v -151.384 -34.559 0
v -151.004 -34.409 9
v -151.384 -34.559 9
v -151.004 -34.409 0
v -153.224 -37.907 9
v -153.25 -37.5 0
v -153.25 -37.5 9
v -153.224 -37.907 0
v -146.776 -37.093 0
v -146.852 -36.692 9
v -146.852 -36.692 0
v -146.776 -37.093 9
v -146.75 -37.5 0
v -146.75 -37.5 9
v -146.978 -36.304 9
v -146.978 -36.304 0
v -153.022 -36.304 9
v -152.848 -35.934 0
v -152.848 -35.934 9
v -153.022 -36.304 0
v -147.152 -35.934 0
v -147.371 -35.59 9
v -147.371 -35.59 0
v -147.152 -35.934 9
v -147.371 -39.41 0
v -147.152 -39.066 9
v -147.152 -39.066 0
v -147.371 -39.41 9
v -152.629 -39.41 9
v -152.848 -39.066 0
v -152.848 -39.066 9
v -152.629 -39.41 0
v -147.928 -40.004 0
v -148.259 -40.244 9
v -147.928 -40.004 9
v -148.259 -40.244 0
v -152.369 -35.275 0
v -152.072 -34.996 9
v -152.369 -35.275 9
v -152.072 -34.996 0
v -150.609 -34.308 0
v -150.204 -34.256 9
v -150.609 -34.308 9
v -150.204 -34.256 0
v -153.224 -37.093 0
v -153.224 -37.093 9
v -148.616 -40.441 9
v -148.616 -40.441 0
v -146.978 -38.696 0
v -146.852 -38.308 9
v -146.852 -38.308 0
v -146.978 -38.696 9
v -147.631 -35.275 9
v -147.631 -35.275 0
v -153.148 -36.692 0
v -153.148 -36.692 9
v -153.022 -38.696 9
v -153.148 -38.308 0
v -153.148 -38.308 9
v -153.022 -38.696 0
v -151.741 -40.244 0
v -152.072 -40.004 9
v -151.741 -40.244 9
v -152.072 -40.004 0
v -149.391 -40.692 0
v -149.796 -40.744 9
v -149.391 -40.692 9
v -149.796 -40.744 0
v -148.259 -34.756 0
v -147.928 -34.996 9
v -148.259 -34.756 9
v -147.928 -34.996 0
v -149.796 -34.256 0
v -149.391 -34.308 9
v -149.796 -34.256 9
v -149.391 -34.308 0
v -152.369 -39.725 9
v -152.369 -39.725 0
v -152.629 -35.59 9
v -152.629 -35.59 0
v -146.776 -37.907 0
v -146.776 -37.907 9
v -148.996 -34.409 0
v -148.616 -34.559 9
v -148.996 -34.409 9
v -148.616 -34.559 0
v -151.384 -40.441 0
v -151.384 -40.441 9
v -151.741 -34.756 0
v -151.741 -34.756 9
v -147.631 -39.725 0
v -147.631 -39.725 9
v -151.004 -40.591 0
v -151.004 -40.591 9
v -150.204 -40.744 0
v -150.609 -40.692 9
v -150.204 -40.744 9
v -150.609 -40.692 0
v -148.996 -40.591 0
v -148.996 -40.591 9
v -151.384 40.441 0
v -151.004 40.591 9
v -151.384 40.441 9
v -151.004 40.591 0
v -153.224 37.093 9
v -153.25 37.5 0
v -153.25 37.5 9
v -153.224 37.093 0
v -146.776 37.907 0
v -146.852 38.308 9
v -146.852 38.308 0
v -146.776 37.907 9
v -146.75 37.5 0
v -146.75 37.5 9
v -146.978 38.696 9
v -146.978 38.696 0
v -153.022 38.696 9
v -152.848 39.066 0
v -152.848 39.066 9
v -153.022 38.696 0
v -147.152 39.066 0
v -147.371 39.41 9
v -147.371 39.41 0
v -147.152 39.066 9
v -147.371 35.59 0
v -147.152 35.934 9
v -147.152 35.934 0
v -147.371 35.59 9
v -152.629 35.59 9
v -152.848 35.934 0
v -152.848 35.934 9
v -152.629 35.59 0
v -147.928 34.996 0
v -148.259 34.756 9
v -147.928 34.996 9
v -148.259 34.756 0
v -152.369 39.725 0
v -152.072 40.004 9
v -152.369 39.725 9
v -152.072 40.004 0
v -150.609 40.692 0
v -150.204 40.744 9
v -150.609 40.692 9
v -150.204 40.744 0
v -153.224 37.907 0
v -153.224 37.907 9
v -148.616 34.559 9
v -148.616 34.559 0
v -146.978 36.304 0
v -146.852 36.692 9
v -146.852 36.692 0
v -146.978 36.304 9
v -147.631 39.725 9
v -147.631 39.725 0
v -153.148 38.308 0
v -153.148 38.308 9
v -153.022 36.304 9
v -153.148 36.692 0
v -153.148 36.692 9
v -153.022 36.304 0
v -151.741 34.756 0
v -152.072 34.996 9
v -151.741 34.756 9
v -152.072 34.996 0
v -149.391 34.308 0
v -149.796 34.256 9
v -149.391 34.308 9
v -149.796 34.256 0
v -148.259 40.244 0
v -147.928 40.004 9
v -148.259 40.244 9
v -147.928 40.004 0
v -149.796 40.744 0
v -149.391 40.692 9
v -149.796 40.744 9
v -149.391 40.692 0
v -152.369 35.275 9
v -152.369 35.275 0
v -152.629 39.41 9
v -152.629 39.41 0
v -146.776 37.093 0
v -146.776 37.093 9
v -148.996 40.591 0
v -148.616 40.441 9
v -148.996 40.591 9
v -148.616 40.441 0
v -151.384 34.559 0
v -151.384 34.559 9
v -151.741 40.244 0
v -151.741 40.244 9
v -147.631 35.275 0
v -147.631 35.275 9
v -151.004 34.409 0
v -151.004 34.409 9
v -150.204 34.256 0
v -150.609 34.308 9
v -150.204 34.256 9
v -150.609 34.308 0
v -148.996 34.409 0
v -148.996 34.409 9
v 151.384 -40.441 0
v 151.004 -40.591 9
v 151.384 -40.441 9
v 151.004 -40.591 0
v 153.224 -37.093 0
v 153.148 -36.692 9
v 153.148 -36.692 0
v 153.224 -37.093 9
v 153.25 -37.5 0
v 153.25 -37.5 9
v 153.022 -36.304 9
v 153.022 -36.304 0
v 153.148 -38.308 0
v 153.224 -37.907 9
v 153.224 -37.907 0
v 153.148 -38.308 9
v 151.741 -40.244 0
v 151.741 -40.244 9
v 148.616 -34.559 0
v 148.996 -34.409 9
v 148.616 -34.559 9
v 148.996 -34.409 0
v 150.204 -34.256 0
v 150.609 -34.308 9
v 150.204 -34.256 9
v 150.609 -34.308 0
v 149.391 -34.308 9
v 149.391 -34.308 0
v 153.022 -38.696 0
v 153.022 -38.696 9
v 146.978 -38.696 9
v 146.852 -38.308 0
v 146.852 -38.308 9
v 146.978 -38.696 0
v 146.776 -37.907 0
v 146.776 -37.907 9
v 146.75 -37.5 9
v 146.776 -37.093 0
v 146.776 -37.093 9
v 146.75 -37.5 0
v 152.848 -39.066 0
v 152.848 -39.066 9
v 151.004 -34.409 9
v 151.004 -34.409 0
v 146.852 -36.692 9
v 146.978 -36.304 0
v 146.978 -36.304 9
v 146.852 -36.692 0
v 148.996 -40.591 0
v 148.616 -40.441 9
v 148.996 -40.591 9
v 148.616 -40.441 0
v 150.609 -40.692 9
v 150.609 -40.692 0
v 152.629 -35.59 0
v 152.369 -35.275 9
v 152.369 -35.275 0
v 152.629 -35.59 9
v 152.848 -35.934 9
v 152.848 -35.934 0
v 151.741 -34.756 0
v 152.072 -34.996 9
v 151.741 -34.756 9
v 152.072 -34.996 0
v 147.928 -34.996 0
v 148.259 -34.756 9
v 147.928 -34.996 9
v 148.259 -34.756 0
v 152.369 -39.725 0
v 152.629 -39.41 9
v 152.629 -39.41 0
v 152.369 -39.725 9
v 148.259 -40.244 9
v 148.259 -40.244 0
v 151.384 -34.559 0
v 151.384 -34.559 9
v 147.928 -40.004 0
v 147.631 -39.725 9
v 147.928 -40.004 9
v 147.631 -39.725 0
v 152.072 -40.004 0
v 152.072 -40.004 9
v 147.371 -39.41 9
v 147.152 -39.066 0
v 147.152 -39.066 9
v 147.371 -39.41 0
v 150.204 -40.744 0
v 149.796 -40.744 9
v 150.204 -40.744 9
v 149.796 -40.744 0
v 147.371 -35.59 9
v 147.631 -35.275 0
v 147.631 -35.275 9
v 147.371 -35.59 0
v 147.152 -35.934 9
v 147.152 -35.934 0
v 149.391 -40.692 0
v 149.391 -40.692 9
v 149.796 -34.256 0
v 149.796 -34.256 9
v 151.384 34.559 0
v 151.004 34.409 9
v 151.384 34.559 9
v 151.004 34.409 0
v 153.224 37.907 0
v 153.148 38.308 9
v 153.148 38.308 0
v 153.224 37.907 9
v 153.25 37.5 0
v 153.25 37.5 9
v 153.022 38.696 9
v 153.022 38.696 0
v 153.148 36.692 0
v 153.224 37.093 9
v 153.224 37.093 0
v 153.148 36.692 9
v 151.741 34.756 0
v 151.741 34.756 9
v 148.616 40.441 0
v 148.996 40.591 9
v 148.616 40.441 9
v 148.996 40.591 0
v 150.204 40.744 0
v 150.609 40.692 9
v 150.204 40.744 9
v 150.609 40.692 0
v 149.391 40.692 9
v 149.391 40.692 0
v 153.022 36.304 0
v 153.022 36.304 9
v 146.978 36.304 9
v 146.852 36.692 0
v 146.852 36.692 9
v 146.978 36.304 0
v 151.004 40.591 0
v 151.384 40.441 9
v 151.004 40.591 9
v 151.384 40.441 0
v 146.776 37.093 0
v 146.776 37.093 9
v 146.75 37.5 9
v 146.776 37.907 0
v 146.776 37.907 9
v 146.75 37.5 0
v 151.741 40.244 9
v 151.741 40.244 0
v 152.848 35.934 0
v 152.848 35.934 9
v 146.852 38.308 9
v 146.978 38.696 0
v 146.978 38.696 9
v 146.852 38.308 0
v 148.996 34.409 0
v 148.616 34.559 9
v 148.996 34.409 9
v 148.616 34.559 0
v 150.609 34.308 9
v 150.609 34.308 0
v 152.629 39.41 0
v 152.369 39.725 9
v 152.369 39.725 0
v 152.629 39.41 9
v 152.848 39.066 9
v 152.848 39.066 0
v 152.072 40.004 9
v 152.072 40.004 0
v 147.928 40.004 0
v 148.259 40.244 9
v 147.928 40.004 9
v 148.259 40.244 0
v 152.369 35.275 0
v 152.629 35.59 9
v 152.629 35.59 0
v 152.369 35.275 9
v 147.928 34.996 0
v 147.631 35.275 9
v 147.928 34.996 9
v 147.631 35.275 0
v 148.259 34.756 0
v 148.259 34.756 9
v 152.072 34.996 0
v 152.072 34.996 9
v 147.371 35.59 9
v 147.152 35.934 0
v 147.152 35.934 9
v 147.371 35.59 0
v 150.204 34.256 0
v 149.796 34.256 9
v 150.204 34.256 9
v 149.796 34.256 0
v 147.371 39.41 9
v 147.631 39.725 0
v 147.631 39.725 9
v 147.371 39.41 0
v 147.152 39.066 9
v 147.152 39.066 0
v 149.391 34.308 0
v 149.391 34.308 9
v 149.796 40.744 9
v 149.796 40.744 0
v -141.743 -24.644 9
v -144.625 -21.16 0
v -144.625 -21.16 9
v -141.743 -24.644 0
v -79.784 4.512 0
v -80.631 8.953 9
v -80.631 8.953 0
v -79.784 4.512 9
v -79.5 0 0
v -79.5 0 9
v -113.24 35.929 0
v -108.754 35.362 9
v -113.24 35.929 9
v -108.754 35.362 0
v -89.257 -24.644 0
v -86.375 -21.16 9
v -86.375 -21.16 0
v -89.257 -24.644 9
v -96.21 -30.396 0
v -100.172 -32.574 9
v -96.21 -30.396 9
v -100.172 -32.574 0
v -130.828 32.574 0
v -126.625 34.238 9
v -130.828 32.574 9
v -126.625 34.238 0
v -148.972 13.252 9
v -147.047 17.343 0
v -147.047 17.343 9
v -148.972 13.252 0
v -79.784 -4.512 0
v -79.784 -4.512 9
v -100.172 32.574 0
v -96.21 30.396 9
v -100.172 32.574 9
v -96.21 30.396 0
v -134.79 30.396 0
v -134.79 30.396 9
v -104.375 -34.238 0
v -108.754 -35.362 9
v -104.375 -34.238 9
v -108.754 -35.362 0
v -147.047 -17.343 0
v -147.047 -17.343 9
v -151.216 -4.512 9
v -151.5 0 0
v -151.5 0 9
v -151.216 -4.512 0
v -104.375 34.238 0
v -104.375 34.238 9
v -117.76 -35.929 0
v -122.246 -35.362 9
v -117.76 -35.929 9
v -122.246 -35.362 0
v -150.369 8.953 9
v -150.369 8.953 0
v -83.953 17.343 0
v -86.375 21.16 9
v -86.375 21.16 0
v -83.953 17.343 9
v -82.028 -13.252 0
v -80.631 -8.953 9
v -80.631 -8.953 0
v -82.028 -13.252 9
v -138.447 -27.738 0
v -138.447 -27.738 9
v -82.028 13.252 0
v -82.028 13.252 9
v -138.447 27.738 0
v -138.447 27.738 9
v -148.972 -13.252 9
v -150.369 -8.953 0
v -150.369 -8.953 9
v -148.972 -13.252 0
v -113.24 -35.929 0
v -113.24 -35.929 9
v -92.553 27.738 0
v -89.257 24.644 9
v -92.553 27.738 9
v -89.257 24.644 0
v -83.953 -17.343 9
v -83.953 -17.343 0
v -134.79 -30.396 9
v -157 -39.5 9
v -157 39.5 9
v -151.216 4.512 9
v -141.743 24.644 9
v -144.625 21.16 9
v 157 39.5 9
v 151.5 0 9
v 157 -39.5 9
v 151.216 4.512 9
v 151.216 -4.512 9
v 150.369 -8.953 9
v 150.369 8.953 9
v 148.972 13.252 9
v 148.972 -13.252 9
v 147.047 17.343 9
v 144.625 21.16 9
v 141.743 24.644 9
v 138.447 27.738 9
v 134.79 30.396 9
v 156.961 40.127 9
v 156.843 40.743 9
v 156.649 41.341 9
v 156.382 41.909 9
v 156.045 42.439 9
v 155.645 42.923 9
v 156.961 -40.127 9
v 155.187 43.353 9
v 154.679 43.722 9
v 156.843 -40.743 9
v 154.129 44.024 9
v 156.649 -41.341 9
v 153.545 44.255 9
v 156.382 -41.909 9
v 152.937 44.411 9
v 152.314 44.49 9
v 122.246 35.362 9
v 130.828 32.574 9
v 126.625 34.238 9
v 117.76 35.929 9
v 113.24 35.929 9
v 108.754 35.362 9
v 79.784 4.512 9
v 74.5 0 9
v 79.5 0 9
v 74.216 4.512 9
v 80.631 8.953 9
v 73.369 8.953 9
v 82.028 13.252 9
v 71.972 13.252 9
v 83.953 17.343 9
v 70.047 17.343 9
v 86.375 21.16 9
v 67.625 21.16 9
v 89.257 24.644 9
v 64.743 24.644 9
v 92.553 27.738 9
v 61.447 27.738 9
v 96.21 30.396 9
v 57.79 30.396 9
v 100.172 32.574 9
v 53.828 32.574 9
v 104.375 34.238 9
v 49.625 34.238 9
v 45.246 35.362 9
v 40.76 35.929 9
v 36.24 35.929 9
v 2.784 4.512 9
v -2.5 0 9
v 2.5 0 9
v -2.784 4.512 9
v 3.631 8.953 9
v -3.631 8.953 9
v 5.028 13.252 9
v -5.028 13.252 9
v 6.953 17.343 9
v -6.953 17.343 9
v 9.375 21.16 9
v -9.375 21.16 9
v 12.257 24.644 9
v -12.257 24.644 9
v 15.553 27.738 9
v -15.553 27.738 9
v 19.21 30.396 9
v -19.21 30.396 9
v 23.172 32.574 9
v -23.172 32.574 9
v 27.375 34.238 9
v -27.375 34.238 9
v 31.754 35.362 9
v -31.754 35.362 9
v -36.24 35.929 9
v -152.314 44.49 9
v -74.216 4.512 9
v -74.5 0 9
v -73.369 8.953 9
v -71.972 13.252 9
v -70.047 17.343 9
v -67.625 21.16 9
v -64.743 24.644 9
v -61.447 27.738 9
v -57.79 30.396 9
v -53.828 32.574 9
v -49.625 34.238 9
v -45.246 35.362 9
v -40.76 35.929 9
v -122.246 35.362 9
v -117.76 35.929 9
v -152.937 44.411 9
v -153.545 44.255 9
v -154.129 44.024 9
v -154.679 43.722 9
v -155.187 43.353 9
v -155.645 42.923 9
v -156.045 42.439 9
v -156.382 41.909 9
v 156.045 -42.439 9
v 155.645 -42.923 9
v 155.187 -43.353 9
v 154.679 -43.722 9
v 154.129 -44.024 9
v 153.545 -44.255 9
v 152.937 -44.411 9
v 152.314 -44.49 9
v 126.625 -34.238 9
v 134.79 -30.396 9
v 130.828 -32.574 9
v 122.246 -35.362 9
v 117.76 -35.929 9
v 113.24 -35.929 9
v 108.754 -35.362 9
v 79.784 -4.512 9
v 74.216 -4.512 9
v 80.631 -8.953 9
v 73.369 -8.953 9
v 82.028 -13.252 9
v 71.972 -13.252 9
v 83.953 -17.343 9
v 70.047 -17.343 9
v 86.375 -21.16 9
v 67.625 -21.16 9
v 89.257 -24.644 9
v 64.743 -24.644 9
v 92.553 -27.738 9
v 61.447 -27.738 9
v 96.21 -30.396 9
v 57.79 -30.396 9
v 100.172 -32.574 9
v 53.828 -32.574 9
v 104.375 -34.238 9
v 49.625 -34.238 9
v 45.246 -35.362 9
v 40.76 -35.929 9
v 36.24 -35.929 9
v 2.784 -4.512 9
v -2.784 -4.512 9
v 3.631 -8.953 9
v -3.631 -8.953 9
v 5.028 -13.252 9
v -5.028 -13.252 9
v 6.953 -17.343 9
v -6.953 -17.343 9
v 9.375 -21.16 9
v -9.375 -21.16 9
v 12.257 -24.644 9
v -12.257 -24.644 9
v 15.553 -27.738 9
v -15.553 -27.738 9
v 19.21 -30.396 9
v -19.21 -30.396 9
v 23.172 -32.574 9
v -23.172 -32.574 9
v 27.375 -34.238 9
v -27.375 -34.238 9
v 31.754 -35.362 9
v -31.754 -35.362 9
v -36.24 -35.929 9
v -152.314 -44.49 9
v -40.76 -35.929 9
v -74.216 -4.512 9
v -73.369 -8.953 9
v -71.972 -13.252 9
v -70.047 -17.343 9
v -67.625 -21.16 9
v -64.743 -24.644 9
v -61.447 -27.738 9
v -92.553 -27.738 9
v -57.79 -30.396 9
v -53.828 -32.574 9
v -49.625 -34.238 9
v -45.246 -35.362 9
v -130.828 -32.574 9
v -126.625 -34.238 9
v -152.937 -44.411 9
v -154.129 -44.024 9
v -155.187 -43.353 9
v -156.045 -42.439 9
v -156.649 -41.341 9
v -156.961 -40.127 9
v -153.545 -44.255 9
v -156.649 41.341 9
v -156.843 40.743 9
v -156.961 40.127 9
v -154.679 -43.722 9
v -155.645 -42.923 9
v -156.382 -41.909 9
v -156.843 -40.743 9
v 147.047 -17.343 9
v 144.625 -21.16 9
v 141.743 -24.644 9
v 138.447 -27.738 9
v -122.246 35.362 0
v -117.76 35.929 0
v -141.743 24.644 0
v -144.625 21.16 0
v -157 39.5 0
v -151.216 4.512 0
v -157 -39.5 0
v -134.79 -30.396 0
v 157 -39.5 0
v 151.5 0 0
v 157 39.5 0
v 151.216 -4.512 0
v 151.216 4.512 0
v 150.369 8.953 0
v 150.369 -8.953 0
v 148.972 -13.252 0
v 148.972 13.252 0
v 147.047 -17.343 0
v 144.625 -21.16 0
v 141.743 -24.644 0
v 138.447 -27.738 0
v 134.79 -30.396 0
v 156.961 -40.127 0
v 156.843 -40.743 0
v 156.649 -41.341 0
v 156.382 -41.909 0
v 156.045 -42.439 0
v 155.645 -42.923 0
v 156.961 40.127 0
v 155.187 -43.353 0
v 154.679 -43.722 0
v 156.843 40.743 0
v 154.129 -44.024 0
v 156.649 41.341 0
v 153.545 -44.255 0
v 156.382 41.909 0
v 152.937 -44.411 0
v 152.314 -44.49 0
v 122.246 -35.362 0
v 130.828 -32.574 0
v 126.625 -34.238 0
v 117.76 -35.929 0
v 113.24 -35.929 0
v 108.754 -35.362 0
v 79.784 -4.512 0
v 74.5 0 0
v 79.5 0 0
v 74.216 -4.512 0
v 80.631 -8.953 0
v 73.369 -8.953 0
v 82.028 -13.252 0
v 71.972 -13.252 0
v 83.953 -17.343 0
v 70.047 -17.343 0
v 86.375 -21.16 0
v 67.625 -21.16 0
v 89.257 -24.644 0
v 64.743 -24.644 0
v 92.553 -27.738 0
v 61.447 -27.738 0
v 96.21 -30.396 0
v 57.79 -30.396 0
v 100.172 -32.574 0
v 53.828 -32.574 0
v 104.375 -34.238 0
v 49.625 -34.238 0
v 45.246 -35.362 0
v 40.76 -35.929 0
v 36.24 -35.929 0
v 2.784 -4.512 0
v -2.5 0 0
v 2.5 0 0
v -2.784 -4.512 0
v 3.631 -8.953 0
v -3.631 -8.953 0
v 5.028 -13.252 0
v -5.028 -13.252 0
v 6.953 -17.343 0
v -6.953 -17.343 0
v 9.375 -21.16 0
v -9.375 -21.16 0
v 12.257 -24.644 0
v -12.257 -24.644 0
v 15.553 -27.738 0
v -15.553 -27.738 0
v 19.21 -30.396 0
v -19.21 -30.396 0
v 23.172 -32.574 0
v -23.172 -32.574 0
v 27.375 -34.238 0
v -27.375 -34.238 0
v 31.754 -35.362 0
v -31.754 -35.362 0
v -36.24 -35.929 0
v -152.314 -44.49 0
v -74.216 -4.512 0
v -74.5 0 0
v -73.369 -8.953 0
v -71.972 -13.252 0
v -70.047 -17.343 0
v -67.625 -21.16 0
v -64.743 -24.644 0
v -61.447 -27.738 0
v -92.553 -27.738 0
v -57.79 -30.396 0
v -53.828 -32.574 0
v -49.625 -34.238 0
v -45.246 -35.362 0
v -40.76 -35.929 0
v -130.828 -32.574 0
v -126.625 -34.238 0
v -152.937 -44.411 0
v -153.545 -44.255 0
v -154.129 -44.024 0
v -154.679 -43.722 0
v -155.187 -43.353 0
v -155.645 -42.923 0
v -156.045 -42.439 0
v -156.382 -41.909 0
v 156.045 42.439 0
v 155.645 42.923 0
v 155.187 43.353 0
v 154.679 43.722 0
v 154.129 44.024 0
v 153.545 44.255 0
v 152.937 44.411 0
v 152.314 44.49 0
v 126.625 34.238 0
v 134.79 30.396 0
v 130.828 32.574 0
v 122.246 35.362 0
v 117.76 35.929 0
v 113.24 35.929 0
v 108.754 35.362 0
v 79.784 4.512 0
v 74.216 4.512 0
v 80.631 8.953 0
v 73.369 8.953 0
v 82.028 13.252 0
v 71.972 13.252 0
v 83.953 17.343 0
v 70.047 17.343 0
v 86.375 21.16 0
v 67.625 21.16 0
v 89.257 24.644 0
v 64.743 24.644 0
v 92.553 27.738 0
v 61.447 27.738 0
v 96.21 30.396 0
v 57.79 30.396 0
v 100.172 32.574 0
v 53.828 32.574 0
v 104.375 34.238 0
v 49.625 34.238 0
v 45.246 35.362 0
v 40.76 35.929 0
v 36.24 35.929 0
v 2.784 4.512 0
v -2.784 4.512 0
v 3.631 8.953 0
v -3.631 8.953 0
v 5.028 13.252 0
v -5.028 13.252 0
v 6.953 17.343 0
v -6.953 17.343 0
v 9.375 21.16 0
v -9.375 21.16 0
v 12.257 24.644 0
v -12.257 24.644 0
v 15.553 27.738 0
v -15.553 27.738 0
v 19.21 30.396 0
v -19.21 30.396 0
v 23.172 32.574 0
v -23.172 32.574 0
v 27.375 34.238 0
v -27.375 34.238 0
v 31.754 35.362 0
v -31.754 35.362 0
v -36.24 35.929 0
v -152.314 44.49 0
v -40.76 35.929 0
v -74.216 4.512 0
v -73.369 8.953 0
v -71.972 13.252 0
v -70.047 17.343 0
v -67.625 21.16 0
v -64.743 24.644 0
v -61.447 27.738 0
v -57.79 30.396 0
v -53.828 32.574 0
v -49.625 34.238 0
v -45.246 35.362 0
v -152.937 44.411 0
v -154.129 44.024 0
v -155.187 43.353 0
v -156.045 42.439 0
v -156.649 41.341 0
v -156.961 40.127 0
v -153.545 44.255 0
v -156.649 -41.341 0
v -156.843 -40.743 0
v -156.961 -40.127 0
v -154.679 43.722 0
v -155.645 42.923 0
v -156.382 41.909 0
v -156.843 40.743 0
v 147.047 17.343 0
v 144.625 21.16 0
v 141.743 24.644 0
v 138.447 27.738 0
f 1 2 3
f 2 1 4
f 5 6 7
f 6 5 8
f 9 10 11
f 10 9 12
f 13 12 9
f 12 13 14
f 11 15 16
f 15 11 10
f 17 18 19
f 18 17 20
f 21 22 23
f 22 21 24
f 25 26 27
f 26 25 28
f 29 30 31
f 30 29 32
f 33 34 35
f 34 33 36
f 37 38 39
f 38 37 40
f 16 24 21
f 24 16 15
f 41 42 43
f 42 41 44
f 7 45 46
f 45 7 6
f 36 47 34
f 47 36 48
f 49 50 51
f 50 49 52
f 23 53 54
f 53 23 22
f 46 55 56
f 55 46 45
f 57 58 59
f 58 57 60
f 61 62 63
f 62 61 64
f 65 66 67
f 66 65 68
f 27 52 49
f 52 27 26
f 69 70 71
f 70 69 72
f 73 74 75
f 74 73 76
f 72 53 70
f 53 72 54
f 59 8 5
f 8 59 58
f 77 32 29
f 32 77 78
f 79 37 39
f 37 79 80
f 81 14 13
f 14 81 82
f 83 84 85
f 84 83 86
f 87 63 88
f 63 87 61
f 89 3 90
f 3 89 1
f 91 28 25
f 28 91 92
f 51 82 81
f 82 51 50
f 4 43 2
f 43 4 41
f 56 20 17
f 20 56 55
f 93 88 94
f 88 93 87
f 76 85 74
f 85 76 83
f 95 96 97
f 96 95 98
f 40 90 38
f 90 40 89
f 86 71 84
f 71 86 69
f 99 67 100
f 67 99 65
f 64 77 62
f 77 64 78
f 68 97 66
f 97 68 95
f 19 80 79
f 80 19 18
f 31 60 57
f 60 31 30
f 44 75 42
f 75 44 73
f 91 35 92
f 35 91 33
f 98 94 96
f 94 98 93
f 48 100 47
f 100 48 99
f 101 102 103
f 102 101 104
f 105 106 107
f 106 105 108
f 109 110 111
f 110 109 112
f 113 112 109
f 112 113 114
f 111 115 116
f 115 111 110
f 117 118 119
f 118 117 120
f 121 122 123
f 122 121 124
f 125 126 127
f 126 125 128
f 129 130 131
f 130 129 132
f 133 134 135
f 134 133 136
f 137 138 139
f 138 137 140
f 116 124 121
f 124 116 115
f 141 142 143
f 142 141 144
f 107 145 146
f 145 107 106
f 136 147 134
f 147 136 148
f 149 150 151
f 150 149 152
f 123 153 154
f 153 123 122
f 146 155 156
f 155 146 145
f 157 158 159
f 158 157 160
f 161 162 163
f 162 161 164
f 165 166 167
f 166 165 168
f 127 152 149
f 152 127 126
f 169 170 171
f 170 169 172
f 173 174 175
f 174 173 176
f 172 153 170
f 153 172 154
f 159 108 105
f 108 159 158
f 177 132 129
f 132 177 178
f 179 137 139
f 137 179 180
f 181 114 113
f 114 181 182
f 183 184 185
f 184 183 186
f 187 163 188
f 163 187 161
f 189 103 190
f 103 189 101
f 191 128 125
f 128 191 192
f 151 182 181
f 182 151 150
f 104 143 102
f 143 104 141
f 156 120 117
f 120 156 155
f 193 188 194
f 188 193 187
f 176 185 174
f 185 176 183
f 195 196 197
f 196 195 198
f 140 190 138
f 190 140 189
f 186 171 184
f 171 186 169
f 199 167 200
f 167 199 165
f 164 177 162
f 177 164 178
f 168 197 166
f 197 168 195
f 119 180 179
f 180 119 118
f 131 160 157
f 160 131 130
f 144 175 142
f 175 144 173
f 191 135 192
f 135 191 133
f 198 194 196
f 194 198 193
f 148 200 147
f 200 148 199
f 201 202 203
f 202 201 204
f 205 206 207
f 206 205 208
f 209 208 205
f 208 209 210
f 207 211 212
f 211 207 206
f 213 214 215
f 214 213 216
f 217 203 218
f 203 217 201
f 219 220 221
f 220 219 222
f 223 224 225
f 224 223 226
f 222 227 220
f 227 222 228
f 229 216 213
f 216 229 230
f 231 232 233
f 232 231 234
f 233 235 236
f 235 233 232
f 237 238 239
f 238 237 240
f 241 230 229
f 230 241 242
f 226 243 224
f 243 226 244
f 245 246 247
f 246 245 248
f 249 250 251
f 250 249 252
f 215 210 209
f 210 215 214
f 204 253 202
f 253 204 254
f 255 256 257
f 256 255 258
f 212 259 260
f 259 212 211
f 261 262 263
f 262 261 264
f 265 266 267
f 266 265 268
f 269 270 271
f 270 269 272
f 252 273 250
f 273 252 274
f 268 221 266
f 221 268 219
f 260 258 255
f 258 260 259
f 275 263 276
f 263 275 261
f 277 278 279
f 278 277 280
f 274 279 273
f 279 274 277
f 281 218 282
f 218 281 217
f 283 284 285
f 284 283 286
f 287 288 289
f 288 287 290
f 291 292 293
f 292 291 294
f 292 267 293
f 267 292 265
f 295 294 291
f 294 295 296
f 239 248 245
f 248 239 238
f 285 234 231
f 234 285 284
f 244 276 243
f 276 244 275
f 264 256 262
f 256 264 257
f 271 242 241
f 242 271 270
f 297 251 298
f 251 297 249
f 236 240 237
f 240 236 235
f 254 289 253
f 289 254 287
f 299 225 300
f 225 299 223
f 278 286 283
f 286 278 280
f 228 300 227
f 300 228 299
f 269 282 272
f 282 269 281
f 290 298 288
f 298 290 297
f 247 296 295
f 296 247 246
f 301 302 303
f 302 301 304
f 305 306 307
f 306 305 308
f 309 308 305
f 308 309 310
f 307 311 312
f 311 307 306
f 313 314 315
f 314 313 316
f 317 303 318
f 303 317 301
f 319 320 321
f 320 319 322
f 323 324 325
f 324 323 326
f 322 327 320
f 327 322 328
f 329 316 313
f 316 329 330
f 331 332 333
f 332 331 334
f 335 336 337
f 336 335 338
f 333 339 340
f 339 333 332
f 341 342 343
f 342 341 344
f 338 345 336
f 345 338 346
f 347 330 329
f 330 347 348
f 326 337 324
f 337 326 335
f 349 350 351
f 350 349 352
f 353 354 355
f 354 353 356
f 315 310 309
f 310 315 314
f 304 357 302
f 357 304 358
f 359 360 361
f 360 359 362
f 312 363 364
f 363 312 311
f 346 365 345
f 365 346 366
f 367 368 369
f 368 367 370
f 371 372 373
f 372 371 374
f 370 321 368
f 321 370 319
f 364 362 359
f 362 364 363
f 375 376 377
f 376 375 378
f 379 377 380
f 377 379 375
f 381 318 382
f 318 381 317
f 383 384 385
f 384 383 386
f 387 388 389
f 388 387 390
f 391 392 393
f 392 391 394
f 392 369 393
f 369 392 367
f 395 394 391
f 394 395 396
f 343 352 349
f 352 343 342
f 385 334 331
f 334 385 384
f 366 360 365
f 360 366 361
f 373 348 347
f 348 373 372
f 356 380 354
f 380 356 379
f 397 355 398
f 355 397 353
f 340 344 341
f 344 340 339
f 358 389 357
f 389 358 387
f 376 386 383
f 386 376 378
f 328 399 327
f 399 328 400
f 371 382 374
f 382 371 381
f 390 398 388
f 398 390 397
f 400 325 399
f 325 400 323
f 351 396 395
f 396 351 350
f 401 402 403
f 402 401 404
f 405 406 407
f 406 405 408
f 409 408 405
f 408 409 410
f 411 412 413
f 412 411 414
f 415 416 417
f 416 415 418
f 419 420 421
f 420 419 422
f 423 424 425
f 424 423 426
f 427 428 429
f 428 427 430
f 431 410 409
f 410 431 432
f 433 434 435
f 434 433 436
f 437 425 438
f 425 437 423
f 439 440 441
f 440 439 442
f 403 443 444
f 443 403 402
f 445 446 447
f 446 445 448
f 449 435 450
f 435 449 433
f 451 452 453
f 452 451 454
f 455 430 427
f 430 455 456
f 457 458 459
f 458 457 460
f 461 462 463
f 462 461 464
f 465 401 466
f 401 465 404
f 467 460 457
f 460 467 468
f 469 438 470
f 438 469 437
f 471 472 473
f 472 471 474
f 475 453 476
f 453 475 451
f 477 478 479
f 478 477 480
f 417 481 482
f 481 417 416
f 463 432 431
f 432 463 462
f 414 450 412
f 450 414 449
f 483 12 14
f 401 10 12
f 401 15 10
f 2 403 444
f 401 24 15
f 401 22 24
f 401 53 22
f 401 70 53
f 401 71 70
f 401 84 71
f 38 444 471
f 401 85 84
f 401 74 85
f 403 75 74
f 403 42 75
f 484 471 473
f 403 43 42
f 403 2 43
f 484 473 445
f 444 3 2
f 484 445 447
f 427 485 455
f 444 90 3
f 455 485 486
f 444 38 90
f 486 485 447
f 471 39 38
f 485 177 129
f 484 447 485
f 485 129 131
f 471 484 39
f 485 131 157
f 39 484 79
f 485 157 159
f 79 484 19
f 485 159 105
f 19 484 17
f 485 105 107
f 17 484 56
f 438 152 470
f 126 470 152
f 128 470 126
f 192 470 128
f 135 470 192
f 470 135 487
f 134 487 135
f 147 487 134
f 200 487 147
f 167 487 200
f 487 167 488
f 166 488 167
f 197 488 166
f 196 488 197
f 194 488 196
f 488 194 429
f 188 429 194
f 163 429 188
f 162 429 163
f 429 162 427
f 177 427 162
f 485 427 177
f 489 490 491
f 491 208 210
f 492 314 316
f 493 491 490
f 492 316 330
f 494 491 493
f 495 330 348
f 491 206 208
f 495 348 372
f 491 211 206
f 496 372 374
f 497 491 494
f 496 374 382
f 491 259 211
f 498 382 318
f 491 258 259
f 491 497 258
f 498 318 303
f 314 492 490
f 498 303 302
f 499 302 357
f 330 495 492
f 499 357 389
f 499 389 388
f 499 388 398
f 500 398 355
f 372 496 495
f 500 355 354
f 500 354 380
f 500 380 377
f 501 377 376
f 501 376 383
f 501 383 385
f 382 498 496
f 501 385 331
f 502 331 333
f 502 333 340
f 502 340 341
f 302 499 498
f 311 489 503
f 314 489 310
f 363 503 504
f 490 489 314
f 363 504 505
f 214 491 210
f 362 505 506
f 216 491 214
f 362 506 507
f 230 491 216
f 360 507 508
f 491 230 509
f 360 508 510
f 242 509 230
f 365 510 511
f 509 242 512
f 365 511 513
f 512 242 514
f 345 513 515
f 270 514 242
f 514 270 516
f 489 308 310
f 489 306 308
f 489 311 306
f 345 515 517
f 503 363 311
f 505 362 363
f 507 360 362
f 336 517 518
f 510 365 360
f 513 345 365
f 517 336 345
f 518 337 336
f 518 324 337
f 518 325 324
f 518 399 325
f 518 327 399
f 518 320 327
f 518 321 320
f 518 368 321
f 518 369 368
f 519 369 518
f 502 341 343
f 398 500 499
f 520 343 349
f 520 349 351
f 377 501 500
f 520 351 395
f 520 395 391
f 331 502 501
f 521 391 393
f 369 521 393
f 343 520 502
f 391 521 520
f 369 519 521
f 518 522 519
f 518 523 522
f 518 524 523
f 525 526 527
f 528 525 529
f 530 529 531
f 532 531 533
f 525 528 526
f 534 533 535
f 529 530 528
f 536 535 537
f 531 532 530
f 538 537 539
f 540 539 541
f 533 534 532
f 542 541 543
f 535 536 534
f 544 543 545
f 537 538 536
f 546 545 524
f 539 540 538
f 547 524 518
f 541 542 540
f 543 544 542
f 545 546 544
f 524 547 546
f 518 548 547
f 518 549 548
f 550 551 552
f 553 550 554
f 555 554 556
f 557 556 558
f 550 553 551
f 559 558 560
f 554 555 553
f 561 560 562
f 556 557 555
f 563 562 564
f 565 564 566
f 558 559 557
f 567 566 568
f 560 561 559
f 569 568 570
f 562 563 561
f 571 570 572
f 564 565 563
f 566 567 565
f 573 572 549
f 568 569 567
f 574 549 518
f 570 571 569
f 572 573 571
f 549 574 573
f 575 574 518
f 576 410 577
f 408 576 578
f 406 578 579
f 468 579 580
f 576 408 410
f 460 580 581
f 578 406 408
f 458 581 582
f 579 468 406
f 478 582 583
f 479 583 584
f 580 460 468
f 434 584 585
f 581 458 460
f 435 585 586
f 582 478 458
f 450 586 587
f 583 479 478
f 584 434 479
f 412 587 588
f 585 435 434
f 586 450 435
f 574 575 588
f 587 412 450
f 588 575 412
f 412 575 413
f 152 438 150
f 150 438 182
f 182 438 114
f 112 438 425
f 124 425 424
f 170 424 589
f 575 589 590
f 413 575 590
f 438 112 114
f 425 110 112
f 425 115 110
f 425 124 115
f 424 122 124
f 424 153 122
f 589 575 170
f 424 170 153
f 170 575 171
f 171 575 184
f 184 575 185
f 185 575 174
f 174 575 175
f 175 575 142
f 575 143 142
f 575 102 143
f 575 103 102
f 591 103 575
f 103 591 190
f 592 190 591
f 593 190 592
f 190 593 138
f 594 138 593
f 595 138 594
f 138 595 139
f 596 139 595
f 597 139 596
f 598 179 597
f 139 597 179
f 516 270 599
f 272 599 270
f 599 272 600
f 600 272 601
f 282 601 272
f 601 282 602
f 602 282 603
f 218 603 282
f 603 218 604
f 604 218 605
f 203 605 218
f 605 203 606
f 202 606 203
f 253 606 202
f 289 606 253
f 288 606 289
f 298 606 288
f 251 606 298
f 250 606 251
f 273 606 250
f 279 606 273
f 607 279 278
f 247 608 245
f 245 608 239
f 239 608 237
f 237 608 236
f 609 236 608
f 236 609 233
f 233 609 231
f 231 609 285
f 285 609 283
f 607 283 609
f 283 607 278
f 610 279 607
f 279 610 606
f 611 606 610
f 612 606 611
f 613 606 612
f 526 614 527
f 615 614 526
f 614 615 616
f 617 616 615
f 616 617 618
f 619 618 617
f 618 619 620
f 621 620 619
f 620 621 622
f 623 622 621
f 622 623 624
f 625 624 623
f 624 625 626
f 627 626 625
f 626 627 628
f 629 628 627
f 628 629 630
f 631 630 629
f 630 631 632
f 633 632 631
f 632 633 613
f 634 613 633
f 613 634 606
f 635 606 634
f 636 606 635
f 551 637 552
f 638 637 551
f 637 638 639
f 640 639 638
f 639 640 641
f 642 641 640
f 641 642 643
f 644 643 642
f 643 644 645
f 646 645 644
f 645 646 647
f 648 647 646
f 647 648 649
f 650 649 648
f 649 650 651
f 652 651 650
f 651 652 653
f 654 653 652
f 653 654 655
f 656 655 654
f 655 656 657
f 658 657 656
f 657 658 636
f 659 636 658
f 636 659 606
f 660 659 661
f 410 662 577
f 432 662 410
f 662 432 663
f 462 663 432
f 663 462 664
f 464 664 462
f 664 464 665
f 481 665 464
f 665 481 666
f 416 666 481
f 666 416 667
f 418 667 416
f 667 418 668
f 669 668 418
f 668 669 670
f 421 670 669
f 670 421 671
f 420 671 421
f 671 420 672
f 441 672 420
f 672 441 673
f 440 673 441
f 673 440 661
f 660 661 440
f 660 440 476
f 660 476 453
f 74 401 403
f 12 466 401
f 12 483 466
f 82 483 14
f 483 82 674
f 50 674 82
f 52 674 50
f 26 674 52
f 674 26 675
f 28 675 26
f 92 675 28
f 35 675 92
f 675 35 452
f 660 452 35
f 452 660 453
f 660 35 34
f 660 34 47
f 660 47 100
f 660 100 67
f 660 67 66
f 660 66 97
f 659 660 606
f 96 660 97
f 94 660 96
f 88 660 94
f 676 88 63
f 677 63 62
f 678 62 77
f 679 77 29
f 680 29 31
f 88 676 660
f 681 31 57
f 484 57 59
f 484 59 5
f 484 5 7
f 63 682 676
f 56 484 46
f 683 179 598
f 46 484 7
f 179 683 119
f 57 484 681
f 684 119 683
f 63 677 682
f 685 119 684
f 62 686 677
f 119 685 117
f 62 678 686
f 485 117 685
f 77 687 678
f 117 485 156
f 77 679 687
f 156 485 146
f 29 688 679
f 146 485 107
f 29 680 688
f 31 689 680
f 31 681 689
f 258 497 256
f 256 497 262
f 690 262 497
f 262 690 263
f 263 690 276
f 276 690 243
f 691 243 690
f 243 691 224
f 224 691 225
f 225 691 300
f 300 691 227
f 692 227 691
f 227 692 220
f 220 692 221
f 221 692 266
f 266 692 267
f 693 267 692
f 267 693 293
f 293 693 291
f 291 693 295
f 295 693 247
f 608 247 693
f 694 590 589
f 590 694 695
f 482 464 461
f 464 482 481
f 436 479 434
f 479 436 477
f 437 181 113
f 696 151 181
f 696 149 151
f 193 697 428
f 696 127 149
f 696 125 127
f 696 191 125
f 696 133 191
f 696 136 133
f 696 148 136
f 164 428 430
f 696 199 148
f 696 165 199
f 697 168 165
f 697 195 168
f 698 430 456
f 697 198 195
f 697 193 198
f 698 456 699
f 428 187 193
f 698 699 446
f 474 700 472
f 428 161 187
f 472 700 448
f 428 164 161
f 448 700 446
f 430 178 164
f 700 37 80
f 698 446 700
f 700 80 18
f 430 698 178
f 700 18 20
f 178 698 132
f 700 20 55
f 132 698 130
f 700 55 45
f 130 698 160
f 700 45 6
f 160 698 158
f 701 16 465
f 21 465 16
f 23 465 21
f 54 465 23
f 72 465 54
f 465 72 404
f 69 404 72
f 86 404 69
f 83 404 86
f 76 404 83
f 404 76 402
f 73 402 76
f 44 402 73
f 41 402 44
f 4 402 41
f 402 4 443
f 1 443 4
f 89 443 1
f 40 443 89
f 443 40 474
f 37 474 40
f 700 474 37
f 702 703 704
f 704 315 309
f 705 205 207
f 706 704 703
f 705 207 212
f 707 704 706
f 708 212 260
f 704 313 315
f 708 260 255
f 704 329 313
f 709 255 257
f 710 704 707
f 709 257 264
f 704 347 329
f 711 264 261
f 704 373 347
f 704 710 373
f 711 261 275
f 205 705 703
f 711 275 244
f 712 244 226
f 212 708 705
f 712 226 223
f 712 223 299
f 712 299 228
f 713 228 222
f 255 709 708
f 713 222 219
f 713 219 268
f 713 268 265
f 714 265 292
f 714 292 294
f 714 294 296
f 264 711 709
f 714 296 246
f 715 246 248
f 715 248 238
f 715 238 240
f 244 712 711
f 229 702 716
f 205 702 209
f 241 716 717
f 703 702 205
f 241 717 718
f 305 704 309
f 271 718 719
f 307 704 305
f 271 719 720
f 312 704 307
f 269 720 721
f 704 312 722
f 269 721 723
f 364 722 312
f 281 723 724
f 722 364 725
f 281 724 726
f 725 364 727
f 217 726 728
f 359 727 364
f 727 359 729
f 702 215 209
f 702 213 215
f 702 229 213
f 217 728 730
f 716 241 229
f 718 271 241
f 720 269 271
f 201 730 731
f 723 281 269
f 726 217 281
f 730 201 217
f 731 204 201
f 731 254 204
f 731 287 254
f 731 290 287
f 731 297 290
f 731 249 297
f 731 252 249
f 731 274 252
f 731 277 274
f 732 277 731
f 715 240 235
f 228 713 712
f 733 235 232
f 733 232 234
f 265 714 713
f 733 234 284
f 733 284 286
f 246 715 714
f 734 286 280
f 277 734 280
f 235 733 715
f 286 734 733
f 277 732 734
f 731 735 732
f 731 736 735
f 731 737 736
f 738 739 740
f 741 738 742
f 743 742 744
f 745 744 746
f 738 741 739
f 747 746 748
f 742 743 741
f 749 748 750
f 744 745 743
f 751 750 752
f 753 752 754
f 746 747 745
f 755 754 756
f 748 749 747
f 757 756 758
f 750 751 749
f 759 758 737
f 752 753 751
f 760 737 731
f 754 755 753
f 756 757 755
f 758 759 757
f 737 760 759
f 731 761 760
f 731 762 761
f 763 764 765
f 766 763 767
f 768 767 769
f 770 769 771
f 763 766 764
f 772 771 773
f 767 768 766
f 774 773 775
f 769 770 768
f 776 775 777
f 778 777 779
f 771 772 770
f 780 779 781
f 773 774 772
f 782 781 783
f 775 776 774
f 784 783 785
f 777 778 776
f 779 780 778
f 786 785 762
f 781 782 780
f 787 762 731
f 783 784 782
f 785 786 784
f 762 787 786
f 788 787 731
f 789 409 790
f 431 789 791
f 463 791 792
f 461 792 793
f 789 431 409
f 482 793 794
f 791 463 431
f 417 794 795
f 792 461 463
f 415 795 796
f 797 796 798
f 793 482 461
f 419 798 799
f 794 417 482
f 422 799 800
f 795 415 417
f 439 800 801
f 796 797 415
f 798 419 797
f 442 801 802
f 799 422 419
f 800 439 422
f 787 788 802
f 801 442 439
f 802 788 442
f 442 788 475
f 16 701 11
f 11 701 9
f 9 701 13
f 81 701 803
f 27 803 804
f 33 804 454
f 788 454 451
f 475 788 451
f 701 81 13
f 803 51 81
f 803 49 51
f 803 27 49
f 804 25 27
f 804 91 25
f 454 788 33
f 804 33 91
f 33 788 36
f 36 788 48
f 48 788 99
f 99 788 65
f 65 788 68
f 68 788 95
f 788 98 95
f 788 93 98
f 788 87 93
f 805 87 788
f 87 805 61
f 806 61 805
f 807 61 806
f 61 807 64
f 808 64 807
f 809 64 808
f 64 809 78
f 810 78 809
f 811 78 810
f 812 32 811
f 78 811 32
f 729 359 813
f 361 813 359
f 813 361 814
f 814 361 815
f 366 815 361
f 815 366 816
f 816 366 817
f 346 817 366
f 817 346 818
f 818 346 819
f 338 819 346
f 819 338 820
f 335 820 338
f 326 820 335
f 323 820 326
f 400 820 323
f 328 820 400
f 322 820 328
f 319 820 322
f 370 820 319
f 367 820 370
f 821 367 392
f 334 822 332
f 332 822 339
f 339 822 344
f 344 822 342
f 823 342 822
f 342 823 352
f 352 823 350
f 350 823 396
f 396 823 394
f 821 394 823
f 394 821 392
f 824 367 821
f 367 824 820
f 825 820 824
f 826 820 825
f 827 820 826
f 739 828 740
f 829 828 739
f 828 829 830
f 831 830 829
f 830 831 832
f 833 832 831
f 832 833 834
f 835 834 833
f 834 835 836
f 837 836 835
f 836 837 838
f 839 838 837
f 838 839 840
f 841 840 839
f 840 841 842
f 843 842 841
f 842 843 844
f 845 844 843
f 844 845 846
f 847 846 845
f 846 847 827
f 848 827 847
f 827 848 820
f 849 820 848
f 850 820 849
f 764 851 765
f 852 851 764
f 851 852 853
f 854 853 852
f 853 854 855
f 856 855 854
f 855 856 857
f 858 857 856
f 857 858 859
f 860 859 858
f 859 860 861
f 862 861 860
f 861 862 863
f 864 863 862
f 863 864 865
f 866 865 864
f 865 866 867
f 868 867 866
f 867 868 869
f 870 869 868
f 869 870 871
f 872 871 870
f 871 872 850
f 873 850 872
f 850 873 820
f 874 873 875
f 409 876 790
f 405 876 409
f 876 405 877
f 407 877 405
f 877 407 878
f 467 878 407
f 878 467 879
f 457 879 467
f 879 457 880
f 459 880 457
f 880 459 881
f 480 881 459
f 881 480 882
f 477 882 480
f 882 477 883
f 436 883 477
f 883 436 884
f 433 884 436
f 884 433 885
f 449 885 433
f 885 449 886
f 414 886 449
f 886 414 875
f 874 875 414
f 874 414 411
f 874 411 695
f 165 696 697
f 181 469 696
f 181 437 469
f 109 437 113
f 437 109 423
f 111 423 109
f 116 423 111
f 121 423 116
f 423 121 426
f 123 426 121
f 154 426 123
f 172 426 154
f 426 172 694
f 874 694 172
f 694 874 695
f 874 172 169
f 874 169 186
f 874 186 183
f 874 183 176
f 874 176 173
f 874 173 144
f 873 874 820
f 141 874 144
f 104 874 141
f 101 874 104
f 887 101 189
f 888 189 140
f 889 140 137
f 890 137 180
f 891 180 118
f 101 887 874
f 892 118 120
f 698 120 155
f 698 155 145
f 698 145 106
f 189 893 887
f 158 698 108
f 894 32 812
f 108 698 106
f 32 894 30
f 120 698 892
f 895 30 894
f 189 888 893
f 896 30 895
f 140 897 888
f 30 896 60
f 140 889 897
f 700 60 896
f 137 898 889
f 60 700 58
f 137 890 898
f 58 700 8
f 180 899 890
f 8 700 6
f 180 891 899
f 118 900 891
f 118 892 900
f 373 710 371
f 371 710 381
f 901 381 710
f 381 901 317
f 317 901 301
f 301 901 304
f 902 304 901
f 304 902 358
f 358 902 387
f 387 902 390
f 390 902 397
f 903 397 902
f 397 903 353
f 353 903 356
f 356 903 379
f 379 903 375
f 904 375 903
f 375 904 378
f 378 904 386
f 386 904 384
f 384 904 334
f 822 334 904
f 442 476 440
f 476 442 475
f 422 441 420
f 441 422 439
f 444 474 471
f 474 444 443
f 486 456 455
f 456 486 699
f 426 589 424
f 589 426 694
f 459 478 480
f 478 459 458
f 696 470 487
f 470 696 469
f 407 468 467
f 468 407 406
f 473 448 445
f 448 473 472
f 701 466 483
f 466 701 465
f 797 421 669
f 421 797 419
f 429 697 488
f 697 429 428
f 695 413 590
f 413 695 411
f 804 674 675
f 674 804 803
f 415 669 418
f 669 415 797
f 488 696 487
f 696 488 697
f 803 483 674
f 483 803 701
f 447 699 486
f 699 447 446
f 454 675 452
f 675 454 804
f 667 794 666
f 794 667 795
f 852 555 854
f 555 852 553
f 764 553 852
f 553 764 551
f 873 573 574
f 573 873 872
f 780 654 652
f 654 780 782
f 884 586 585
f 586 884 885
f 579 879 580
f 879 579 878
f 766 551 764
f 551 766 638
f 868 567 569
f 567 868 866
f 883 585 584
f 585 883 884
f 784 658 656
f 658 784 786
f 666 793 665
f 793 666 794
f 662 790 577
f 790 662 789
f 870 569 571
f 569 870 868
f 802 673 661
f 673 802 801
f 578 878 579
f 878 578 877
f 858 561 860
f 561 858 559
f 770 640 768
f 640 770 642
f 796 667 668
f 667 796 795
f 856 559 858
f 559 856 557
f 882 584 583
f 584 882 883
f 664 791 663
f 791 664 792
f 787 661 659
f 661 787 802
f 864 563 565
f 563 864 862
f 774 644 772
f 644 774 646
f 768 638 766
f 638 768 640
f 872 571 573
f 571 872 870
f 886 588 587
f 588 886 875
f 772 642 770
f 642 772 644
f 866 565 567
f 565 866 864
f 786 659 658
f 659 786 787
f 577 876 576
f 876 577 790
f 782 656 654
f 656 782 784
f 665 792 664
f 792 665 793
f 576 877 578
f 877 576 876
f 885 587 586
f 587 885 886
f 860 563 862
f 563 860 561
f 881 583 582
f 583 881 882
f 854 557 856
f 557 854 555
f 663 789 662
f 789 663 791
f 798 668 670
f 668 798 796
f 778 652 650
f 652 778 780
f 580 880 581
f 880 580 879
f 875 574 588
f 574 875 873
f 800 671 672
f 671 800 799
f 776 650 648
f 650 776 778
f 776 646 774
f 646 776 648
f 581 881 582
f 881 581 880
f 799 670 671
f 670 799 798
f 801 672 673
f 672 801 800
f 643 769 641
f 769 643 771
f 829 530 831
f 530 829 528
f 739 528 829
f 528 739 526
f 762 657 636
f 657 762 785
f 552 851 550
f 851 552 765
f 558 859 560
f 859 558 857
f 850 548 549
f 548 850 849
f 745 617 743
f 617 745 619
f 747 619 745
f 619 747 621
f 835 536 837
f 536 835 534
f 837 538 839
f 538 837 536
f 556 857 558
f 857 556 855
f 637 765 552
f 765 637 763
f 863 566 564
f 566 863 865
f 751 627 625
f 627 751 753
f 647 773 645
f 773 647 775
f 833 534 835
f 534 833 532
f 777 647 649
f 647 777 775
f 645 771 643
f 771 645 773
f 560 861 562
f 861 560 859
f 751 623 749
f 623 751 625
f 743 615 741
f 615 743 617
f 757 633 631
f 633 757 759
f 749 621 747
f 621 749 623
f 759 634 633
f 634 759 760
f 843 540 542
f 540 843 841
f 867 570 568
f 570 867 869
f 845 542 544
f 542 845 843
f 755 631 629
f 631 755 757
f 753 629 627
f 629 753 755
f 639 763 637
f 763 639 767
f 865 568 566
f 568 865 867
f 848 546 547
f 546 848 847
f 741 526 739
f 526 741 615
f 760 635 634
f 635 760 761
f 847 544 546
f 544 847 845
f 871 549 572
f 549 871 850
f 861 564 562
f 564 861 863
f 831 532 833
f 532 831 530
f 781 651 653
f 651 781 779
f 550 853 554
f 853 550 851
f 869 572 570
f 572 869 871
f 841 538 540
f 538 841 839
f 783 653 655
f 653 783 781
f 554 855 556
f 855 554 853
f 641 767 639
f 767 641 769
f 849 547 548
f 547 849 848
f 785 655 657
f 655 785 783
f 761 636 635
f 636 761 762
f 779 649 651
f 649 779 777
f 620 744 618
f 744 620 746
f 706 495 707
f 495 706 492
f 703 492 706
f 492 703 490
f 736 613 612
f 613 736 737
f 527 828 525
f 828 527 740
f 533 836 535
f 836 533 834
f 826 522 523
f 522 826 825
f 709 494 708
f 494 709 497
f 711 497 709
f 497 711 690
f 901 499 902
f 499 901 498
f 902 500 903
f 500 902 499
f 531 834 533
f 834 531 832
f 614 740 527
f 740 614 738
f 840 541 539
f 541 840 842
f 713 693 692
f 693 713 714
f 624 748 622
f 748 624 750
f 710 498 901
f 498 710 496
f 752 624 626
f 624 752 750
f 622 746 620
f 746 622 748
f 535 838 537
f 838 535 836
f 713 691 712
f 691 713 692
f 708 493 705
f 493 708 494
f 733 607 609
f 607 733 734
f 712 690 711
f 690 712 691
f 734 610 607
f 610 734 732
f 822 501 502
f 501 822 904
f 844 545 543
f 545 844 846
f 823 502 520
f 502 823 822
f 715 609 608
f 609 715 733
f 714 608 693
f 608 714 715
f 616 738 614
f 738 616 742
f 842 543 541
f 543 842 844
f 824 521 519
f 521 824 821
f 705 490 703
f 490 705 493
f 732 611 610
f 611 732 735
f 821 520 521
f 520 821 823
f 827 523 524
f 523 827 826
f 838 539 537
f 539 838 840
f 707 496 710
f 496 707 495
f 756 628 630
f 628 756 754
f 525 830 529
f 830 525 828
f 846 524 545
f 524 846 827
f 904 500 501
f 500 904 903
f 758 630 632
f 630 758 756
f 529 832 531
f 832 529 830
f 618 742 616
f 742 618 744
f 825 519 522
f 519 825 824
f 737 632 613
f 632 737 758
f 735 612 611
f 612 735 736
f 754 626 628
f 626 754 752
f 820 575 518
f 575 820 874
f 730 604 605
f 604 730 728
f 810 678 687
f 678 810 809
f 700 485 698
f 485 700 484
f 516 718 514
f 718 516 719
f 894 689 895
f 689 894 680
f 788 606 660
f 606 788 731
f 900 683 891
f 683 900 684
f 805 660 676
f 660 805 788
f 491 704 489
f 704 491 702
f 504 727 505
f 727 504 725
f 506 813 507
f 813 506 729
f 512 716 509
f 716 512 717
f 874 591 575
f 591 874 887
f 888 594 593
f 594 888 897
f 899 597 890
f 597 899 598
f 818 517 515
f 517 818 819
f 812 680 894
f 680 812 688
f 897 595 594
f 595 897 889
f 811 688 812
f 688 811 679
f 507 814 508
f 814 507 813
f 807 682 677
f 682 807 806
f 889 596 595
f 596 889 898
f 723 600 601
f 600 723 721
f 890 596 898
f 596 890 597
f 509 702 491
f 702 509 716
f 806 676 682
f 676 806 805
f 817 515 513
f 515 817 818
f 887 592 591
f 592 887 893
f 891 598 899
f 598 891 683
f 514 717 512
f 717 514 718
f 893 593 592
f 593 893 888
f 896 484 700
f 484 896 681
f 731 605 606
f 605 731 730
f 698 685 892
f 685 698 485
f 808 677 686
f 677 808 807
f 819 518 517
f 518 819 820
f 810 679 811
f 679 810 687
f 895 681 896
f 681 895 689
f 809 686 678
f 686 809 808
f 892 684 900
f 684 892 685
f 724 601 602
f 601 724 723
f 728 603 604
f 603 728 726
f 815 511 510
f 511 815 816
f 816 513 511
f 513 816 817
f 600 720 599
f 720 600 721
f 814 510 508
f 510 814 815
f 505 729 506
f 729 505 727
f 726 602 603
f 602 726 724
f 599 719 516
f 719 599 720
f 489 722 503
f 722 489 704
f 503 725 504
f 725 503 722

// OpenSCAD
$fn = 50;

difference() {
	union() {
		hull() {
			translate(v = [-152.0, 39.5, 0]) {
				cylinder(h = 9, r = 5);
			}
			translate(v = [152.0, 39.5, 0]) {
				cylinder(h = 9, r = 5);
			}
			translate(v = [-152.0, -39.5, 0]) {
				cylinder(h = 9, r = 5);
			}
			translate(v = [152.0, -39.5, 0]) {
				cylinder(h = 9, r = 5);
			}
		}
	}
	union() {
		translate(v = [-150.0, -37.5, -100.0]) {
			cylinder(h = 200, r = 3.25);
		}
		translate(v = [-150.0, 37.5, -100.0]) {
			cylinder(h = 200, r = 3.25);
		}
		translate(v = [150.0, -37.5, -100.0]) {
			cylinder(h = 200, r = 3.25);
		}
		translate(v = [150.0, 37.5, -100.0]) {
			cylinder(h = 200, r = 3.25);
		}
		translate(v = [-150.0, -37.5, -100.0]) {
			cylinder(h = 200, r = 1.8);
		}
		translate(v = [-150.0, 37.5, -100.0]) {
			cylinder(h = 200, r = 1.8);
		}
		translate(v = [150.0, -37.5, -100.0]) {
			cylinder(h = 200, r = 1.8);
		}
		translate(v = [150.0, 37.5, -100.0]) {
			cylinder(h = 200, r = 1.8);
		}
		translate(v = [-115.5, 0, 0.0]) {
			cylinder(h = 9, r = 36.0);
		}
		translate(v = [-38.5, 0, 0.0]) {
			cylinder(h = 9, r = 36.0);
		}
		translate(v = [38.5, 0, 0.0]) {
			cylinder(h = 9, r = 36.0);
		}
		translate(v = [115.5, 0, 0.0]) {
			cylinder(h = 9, r = 36.0);
		}
	}
}
